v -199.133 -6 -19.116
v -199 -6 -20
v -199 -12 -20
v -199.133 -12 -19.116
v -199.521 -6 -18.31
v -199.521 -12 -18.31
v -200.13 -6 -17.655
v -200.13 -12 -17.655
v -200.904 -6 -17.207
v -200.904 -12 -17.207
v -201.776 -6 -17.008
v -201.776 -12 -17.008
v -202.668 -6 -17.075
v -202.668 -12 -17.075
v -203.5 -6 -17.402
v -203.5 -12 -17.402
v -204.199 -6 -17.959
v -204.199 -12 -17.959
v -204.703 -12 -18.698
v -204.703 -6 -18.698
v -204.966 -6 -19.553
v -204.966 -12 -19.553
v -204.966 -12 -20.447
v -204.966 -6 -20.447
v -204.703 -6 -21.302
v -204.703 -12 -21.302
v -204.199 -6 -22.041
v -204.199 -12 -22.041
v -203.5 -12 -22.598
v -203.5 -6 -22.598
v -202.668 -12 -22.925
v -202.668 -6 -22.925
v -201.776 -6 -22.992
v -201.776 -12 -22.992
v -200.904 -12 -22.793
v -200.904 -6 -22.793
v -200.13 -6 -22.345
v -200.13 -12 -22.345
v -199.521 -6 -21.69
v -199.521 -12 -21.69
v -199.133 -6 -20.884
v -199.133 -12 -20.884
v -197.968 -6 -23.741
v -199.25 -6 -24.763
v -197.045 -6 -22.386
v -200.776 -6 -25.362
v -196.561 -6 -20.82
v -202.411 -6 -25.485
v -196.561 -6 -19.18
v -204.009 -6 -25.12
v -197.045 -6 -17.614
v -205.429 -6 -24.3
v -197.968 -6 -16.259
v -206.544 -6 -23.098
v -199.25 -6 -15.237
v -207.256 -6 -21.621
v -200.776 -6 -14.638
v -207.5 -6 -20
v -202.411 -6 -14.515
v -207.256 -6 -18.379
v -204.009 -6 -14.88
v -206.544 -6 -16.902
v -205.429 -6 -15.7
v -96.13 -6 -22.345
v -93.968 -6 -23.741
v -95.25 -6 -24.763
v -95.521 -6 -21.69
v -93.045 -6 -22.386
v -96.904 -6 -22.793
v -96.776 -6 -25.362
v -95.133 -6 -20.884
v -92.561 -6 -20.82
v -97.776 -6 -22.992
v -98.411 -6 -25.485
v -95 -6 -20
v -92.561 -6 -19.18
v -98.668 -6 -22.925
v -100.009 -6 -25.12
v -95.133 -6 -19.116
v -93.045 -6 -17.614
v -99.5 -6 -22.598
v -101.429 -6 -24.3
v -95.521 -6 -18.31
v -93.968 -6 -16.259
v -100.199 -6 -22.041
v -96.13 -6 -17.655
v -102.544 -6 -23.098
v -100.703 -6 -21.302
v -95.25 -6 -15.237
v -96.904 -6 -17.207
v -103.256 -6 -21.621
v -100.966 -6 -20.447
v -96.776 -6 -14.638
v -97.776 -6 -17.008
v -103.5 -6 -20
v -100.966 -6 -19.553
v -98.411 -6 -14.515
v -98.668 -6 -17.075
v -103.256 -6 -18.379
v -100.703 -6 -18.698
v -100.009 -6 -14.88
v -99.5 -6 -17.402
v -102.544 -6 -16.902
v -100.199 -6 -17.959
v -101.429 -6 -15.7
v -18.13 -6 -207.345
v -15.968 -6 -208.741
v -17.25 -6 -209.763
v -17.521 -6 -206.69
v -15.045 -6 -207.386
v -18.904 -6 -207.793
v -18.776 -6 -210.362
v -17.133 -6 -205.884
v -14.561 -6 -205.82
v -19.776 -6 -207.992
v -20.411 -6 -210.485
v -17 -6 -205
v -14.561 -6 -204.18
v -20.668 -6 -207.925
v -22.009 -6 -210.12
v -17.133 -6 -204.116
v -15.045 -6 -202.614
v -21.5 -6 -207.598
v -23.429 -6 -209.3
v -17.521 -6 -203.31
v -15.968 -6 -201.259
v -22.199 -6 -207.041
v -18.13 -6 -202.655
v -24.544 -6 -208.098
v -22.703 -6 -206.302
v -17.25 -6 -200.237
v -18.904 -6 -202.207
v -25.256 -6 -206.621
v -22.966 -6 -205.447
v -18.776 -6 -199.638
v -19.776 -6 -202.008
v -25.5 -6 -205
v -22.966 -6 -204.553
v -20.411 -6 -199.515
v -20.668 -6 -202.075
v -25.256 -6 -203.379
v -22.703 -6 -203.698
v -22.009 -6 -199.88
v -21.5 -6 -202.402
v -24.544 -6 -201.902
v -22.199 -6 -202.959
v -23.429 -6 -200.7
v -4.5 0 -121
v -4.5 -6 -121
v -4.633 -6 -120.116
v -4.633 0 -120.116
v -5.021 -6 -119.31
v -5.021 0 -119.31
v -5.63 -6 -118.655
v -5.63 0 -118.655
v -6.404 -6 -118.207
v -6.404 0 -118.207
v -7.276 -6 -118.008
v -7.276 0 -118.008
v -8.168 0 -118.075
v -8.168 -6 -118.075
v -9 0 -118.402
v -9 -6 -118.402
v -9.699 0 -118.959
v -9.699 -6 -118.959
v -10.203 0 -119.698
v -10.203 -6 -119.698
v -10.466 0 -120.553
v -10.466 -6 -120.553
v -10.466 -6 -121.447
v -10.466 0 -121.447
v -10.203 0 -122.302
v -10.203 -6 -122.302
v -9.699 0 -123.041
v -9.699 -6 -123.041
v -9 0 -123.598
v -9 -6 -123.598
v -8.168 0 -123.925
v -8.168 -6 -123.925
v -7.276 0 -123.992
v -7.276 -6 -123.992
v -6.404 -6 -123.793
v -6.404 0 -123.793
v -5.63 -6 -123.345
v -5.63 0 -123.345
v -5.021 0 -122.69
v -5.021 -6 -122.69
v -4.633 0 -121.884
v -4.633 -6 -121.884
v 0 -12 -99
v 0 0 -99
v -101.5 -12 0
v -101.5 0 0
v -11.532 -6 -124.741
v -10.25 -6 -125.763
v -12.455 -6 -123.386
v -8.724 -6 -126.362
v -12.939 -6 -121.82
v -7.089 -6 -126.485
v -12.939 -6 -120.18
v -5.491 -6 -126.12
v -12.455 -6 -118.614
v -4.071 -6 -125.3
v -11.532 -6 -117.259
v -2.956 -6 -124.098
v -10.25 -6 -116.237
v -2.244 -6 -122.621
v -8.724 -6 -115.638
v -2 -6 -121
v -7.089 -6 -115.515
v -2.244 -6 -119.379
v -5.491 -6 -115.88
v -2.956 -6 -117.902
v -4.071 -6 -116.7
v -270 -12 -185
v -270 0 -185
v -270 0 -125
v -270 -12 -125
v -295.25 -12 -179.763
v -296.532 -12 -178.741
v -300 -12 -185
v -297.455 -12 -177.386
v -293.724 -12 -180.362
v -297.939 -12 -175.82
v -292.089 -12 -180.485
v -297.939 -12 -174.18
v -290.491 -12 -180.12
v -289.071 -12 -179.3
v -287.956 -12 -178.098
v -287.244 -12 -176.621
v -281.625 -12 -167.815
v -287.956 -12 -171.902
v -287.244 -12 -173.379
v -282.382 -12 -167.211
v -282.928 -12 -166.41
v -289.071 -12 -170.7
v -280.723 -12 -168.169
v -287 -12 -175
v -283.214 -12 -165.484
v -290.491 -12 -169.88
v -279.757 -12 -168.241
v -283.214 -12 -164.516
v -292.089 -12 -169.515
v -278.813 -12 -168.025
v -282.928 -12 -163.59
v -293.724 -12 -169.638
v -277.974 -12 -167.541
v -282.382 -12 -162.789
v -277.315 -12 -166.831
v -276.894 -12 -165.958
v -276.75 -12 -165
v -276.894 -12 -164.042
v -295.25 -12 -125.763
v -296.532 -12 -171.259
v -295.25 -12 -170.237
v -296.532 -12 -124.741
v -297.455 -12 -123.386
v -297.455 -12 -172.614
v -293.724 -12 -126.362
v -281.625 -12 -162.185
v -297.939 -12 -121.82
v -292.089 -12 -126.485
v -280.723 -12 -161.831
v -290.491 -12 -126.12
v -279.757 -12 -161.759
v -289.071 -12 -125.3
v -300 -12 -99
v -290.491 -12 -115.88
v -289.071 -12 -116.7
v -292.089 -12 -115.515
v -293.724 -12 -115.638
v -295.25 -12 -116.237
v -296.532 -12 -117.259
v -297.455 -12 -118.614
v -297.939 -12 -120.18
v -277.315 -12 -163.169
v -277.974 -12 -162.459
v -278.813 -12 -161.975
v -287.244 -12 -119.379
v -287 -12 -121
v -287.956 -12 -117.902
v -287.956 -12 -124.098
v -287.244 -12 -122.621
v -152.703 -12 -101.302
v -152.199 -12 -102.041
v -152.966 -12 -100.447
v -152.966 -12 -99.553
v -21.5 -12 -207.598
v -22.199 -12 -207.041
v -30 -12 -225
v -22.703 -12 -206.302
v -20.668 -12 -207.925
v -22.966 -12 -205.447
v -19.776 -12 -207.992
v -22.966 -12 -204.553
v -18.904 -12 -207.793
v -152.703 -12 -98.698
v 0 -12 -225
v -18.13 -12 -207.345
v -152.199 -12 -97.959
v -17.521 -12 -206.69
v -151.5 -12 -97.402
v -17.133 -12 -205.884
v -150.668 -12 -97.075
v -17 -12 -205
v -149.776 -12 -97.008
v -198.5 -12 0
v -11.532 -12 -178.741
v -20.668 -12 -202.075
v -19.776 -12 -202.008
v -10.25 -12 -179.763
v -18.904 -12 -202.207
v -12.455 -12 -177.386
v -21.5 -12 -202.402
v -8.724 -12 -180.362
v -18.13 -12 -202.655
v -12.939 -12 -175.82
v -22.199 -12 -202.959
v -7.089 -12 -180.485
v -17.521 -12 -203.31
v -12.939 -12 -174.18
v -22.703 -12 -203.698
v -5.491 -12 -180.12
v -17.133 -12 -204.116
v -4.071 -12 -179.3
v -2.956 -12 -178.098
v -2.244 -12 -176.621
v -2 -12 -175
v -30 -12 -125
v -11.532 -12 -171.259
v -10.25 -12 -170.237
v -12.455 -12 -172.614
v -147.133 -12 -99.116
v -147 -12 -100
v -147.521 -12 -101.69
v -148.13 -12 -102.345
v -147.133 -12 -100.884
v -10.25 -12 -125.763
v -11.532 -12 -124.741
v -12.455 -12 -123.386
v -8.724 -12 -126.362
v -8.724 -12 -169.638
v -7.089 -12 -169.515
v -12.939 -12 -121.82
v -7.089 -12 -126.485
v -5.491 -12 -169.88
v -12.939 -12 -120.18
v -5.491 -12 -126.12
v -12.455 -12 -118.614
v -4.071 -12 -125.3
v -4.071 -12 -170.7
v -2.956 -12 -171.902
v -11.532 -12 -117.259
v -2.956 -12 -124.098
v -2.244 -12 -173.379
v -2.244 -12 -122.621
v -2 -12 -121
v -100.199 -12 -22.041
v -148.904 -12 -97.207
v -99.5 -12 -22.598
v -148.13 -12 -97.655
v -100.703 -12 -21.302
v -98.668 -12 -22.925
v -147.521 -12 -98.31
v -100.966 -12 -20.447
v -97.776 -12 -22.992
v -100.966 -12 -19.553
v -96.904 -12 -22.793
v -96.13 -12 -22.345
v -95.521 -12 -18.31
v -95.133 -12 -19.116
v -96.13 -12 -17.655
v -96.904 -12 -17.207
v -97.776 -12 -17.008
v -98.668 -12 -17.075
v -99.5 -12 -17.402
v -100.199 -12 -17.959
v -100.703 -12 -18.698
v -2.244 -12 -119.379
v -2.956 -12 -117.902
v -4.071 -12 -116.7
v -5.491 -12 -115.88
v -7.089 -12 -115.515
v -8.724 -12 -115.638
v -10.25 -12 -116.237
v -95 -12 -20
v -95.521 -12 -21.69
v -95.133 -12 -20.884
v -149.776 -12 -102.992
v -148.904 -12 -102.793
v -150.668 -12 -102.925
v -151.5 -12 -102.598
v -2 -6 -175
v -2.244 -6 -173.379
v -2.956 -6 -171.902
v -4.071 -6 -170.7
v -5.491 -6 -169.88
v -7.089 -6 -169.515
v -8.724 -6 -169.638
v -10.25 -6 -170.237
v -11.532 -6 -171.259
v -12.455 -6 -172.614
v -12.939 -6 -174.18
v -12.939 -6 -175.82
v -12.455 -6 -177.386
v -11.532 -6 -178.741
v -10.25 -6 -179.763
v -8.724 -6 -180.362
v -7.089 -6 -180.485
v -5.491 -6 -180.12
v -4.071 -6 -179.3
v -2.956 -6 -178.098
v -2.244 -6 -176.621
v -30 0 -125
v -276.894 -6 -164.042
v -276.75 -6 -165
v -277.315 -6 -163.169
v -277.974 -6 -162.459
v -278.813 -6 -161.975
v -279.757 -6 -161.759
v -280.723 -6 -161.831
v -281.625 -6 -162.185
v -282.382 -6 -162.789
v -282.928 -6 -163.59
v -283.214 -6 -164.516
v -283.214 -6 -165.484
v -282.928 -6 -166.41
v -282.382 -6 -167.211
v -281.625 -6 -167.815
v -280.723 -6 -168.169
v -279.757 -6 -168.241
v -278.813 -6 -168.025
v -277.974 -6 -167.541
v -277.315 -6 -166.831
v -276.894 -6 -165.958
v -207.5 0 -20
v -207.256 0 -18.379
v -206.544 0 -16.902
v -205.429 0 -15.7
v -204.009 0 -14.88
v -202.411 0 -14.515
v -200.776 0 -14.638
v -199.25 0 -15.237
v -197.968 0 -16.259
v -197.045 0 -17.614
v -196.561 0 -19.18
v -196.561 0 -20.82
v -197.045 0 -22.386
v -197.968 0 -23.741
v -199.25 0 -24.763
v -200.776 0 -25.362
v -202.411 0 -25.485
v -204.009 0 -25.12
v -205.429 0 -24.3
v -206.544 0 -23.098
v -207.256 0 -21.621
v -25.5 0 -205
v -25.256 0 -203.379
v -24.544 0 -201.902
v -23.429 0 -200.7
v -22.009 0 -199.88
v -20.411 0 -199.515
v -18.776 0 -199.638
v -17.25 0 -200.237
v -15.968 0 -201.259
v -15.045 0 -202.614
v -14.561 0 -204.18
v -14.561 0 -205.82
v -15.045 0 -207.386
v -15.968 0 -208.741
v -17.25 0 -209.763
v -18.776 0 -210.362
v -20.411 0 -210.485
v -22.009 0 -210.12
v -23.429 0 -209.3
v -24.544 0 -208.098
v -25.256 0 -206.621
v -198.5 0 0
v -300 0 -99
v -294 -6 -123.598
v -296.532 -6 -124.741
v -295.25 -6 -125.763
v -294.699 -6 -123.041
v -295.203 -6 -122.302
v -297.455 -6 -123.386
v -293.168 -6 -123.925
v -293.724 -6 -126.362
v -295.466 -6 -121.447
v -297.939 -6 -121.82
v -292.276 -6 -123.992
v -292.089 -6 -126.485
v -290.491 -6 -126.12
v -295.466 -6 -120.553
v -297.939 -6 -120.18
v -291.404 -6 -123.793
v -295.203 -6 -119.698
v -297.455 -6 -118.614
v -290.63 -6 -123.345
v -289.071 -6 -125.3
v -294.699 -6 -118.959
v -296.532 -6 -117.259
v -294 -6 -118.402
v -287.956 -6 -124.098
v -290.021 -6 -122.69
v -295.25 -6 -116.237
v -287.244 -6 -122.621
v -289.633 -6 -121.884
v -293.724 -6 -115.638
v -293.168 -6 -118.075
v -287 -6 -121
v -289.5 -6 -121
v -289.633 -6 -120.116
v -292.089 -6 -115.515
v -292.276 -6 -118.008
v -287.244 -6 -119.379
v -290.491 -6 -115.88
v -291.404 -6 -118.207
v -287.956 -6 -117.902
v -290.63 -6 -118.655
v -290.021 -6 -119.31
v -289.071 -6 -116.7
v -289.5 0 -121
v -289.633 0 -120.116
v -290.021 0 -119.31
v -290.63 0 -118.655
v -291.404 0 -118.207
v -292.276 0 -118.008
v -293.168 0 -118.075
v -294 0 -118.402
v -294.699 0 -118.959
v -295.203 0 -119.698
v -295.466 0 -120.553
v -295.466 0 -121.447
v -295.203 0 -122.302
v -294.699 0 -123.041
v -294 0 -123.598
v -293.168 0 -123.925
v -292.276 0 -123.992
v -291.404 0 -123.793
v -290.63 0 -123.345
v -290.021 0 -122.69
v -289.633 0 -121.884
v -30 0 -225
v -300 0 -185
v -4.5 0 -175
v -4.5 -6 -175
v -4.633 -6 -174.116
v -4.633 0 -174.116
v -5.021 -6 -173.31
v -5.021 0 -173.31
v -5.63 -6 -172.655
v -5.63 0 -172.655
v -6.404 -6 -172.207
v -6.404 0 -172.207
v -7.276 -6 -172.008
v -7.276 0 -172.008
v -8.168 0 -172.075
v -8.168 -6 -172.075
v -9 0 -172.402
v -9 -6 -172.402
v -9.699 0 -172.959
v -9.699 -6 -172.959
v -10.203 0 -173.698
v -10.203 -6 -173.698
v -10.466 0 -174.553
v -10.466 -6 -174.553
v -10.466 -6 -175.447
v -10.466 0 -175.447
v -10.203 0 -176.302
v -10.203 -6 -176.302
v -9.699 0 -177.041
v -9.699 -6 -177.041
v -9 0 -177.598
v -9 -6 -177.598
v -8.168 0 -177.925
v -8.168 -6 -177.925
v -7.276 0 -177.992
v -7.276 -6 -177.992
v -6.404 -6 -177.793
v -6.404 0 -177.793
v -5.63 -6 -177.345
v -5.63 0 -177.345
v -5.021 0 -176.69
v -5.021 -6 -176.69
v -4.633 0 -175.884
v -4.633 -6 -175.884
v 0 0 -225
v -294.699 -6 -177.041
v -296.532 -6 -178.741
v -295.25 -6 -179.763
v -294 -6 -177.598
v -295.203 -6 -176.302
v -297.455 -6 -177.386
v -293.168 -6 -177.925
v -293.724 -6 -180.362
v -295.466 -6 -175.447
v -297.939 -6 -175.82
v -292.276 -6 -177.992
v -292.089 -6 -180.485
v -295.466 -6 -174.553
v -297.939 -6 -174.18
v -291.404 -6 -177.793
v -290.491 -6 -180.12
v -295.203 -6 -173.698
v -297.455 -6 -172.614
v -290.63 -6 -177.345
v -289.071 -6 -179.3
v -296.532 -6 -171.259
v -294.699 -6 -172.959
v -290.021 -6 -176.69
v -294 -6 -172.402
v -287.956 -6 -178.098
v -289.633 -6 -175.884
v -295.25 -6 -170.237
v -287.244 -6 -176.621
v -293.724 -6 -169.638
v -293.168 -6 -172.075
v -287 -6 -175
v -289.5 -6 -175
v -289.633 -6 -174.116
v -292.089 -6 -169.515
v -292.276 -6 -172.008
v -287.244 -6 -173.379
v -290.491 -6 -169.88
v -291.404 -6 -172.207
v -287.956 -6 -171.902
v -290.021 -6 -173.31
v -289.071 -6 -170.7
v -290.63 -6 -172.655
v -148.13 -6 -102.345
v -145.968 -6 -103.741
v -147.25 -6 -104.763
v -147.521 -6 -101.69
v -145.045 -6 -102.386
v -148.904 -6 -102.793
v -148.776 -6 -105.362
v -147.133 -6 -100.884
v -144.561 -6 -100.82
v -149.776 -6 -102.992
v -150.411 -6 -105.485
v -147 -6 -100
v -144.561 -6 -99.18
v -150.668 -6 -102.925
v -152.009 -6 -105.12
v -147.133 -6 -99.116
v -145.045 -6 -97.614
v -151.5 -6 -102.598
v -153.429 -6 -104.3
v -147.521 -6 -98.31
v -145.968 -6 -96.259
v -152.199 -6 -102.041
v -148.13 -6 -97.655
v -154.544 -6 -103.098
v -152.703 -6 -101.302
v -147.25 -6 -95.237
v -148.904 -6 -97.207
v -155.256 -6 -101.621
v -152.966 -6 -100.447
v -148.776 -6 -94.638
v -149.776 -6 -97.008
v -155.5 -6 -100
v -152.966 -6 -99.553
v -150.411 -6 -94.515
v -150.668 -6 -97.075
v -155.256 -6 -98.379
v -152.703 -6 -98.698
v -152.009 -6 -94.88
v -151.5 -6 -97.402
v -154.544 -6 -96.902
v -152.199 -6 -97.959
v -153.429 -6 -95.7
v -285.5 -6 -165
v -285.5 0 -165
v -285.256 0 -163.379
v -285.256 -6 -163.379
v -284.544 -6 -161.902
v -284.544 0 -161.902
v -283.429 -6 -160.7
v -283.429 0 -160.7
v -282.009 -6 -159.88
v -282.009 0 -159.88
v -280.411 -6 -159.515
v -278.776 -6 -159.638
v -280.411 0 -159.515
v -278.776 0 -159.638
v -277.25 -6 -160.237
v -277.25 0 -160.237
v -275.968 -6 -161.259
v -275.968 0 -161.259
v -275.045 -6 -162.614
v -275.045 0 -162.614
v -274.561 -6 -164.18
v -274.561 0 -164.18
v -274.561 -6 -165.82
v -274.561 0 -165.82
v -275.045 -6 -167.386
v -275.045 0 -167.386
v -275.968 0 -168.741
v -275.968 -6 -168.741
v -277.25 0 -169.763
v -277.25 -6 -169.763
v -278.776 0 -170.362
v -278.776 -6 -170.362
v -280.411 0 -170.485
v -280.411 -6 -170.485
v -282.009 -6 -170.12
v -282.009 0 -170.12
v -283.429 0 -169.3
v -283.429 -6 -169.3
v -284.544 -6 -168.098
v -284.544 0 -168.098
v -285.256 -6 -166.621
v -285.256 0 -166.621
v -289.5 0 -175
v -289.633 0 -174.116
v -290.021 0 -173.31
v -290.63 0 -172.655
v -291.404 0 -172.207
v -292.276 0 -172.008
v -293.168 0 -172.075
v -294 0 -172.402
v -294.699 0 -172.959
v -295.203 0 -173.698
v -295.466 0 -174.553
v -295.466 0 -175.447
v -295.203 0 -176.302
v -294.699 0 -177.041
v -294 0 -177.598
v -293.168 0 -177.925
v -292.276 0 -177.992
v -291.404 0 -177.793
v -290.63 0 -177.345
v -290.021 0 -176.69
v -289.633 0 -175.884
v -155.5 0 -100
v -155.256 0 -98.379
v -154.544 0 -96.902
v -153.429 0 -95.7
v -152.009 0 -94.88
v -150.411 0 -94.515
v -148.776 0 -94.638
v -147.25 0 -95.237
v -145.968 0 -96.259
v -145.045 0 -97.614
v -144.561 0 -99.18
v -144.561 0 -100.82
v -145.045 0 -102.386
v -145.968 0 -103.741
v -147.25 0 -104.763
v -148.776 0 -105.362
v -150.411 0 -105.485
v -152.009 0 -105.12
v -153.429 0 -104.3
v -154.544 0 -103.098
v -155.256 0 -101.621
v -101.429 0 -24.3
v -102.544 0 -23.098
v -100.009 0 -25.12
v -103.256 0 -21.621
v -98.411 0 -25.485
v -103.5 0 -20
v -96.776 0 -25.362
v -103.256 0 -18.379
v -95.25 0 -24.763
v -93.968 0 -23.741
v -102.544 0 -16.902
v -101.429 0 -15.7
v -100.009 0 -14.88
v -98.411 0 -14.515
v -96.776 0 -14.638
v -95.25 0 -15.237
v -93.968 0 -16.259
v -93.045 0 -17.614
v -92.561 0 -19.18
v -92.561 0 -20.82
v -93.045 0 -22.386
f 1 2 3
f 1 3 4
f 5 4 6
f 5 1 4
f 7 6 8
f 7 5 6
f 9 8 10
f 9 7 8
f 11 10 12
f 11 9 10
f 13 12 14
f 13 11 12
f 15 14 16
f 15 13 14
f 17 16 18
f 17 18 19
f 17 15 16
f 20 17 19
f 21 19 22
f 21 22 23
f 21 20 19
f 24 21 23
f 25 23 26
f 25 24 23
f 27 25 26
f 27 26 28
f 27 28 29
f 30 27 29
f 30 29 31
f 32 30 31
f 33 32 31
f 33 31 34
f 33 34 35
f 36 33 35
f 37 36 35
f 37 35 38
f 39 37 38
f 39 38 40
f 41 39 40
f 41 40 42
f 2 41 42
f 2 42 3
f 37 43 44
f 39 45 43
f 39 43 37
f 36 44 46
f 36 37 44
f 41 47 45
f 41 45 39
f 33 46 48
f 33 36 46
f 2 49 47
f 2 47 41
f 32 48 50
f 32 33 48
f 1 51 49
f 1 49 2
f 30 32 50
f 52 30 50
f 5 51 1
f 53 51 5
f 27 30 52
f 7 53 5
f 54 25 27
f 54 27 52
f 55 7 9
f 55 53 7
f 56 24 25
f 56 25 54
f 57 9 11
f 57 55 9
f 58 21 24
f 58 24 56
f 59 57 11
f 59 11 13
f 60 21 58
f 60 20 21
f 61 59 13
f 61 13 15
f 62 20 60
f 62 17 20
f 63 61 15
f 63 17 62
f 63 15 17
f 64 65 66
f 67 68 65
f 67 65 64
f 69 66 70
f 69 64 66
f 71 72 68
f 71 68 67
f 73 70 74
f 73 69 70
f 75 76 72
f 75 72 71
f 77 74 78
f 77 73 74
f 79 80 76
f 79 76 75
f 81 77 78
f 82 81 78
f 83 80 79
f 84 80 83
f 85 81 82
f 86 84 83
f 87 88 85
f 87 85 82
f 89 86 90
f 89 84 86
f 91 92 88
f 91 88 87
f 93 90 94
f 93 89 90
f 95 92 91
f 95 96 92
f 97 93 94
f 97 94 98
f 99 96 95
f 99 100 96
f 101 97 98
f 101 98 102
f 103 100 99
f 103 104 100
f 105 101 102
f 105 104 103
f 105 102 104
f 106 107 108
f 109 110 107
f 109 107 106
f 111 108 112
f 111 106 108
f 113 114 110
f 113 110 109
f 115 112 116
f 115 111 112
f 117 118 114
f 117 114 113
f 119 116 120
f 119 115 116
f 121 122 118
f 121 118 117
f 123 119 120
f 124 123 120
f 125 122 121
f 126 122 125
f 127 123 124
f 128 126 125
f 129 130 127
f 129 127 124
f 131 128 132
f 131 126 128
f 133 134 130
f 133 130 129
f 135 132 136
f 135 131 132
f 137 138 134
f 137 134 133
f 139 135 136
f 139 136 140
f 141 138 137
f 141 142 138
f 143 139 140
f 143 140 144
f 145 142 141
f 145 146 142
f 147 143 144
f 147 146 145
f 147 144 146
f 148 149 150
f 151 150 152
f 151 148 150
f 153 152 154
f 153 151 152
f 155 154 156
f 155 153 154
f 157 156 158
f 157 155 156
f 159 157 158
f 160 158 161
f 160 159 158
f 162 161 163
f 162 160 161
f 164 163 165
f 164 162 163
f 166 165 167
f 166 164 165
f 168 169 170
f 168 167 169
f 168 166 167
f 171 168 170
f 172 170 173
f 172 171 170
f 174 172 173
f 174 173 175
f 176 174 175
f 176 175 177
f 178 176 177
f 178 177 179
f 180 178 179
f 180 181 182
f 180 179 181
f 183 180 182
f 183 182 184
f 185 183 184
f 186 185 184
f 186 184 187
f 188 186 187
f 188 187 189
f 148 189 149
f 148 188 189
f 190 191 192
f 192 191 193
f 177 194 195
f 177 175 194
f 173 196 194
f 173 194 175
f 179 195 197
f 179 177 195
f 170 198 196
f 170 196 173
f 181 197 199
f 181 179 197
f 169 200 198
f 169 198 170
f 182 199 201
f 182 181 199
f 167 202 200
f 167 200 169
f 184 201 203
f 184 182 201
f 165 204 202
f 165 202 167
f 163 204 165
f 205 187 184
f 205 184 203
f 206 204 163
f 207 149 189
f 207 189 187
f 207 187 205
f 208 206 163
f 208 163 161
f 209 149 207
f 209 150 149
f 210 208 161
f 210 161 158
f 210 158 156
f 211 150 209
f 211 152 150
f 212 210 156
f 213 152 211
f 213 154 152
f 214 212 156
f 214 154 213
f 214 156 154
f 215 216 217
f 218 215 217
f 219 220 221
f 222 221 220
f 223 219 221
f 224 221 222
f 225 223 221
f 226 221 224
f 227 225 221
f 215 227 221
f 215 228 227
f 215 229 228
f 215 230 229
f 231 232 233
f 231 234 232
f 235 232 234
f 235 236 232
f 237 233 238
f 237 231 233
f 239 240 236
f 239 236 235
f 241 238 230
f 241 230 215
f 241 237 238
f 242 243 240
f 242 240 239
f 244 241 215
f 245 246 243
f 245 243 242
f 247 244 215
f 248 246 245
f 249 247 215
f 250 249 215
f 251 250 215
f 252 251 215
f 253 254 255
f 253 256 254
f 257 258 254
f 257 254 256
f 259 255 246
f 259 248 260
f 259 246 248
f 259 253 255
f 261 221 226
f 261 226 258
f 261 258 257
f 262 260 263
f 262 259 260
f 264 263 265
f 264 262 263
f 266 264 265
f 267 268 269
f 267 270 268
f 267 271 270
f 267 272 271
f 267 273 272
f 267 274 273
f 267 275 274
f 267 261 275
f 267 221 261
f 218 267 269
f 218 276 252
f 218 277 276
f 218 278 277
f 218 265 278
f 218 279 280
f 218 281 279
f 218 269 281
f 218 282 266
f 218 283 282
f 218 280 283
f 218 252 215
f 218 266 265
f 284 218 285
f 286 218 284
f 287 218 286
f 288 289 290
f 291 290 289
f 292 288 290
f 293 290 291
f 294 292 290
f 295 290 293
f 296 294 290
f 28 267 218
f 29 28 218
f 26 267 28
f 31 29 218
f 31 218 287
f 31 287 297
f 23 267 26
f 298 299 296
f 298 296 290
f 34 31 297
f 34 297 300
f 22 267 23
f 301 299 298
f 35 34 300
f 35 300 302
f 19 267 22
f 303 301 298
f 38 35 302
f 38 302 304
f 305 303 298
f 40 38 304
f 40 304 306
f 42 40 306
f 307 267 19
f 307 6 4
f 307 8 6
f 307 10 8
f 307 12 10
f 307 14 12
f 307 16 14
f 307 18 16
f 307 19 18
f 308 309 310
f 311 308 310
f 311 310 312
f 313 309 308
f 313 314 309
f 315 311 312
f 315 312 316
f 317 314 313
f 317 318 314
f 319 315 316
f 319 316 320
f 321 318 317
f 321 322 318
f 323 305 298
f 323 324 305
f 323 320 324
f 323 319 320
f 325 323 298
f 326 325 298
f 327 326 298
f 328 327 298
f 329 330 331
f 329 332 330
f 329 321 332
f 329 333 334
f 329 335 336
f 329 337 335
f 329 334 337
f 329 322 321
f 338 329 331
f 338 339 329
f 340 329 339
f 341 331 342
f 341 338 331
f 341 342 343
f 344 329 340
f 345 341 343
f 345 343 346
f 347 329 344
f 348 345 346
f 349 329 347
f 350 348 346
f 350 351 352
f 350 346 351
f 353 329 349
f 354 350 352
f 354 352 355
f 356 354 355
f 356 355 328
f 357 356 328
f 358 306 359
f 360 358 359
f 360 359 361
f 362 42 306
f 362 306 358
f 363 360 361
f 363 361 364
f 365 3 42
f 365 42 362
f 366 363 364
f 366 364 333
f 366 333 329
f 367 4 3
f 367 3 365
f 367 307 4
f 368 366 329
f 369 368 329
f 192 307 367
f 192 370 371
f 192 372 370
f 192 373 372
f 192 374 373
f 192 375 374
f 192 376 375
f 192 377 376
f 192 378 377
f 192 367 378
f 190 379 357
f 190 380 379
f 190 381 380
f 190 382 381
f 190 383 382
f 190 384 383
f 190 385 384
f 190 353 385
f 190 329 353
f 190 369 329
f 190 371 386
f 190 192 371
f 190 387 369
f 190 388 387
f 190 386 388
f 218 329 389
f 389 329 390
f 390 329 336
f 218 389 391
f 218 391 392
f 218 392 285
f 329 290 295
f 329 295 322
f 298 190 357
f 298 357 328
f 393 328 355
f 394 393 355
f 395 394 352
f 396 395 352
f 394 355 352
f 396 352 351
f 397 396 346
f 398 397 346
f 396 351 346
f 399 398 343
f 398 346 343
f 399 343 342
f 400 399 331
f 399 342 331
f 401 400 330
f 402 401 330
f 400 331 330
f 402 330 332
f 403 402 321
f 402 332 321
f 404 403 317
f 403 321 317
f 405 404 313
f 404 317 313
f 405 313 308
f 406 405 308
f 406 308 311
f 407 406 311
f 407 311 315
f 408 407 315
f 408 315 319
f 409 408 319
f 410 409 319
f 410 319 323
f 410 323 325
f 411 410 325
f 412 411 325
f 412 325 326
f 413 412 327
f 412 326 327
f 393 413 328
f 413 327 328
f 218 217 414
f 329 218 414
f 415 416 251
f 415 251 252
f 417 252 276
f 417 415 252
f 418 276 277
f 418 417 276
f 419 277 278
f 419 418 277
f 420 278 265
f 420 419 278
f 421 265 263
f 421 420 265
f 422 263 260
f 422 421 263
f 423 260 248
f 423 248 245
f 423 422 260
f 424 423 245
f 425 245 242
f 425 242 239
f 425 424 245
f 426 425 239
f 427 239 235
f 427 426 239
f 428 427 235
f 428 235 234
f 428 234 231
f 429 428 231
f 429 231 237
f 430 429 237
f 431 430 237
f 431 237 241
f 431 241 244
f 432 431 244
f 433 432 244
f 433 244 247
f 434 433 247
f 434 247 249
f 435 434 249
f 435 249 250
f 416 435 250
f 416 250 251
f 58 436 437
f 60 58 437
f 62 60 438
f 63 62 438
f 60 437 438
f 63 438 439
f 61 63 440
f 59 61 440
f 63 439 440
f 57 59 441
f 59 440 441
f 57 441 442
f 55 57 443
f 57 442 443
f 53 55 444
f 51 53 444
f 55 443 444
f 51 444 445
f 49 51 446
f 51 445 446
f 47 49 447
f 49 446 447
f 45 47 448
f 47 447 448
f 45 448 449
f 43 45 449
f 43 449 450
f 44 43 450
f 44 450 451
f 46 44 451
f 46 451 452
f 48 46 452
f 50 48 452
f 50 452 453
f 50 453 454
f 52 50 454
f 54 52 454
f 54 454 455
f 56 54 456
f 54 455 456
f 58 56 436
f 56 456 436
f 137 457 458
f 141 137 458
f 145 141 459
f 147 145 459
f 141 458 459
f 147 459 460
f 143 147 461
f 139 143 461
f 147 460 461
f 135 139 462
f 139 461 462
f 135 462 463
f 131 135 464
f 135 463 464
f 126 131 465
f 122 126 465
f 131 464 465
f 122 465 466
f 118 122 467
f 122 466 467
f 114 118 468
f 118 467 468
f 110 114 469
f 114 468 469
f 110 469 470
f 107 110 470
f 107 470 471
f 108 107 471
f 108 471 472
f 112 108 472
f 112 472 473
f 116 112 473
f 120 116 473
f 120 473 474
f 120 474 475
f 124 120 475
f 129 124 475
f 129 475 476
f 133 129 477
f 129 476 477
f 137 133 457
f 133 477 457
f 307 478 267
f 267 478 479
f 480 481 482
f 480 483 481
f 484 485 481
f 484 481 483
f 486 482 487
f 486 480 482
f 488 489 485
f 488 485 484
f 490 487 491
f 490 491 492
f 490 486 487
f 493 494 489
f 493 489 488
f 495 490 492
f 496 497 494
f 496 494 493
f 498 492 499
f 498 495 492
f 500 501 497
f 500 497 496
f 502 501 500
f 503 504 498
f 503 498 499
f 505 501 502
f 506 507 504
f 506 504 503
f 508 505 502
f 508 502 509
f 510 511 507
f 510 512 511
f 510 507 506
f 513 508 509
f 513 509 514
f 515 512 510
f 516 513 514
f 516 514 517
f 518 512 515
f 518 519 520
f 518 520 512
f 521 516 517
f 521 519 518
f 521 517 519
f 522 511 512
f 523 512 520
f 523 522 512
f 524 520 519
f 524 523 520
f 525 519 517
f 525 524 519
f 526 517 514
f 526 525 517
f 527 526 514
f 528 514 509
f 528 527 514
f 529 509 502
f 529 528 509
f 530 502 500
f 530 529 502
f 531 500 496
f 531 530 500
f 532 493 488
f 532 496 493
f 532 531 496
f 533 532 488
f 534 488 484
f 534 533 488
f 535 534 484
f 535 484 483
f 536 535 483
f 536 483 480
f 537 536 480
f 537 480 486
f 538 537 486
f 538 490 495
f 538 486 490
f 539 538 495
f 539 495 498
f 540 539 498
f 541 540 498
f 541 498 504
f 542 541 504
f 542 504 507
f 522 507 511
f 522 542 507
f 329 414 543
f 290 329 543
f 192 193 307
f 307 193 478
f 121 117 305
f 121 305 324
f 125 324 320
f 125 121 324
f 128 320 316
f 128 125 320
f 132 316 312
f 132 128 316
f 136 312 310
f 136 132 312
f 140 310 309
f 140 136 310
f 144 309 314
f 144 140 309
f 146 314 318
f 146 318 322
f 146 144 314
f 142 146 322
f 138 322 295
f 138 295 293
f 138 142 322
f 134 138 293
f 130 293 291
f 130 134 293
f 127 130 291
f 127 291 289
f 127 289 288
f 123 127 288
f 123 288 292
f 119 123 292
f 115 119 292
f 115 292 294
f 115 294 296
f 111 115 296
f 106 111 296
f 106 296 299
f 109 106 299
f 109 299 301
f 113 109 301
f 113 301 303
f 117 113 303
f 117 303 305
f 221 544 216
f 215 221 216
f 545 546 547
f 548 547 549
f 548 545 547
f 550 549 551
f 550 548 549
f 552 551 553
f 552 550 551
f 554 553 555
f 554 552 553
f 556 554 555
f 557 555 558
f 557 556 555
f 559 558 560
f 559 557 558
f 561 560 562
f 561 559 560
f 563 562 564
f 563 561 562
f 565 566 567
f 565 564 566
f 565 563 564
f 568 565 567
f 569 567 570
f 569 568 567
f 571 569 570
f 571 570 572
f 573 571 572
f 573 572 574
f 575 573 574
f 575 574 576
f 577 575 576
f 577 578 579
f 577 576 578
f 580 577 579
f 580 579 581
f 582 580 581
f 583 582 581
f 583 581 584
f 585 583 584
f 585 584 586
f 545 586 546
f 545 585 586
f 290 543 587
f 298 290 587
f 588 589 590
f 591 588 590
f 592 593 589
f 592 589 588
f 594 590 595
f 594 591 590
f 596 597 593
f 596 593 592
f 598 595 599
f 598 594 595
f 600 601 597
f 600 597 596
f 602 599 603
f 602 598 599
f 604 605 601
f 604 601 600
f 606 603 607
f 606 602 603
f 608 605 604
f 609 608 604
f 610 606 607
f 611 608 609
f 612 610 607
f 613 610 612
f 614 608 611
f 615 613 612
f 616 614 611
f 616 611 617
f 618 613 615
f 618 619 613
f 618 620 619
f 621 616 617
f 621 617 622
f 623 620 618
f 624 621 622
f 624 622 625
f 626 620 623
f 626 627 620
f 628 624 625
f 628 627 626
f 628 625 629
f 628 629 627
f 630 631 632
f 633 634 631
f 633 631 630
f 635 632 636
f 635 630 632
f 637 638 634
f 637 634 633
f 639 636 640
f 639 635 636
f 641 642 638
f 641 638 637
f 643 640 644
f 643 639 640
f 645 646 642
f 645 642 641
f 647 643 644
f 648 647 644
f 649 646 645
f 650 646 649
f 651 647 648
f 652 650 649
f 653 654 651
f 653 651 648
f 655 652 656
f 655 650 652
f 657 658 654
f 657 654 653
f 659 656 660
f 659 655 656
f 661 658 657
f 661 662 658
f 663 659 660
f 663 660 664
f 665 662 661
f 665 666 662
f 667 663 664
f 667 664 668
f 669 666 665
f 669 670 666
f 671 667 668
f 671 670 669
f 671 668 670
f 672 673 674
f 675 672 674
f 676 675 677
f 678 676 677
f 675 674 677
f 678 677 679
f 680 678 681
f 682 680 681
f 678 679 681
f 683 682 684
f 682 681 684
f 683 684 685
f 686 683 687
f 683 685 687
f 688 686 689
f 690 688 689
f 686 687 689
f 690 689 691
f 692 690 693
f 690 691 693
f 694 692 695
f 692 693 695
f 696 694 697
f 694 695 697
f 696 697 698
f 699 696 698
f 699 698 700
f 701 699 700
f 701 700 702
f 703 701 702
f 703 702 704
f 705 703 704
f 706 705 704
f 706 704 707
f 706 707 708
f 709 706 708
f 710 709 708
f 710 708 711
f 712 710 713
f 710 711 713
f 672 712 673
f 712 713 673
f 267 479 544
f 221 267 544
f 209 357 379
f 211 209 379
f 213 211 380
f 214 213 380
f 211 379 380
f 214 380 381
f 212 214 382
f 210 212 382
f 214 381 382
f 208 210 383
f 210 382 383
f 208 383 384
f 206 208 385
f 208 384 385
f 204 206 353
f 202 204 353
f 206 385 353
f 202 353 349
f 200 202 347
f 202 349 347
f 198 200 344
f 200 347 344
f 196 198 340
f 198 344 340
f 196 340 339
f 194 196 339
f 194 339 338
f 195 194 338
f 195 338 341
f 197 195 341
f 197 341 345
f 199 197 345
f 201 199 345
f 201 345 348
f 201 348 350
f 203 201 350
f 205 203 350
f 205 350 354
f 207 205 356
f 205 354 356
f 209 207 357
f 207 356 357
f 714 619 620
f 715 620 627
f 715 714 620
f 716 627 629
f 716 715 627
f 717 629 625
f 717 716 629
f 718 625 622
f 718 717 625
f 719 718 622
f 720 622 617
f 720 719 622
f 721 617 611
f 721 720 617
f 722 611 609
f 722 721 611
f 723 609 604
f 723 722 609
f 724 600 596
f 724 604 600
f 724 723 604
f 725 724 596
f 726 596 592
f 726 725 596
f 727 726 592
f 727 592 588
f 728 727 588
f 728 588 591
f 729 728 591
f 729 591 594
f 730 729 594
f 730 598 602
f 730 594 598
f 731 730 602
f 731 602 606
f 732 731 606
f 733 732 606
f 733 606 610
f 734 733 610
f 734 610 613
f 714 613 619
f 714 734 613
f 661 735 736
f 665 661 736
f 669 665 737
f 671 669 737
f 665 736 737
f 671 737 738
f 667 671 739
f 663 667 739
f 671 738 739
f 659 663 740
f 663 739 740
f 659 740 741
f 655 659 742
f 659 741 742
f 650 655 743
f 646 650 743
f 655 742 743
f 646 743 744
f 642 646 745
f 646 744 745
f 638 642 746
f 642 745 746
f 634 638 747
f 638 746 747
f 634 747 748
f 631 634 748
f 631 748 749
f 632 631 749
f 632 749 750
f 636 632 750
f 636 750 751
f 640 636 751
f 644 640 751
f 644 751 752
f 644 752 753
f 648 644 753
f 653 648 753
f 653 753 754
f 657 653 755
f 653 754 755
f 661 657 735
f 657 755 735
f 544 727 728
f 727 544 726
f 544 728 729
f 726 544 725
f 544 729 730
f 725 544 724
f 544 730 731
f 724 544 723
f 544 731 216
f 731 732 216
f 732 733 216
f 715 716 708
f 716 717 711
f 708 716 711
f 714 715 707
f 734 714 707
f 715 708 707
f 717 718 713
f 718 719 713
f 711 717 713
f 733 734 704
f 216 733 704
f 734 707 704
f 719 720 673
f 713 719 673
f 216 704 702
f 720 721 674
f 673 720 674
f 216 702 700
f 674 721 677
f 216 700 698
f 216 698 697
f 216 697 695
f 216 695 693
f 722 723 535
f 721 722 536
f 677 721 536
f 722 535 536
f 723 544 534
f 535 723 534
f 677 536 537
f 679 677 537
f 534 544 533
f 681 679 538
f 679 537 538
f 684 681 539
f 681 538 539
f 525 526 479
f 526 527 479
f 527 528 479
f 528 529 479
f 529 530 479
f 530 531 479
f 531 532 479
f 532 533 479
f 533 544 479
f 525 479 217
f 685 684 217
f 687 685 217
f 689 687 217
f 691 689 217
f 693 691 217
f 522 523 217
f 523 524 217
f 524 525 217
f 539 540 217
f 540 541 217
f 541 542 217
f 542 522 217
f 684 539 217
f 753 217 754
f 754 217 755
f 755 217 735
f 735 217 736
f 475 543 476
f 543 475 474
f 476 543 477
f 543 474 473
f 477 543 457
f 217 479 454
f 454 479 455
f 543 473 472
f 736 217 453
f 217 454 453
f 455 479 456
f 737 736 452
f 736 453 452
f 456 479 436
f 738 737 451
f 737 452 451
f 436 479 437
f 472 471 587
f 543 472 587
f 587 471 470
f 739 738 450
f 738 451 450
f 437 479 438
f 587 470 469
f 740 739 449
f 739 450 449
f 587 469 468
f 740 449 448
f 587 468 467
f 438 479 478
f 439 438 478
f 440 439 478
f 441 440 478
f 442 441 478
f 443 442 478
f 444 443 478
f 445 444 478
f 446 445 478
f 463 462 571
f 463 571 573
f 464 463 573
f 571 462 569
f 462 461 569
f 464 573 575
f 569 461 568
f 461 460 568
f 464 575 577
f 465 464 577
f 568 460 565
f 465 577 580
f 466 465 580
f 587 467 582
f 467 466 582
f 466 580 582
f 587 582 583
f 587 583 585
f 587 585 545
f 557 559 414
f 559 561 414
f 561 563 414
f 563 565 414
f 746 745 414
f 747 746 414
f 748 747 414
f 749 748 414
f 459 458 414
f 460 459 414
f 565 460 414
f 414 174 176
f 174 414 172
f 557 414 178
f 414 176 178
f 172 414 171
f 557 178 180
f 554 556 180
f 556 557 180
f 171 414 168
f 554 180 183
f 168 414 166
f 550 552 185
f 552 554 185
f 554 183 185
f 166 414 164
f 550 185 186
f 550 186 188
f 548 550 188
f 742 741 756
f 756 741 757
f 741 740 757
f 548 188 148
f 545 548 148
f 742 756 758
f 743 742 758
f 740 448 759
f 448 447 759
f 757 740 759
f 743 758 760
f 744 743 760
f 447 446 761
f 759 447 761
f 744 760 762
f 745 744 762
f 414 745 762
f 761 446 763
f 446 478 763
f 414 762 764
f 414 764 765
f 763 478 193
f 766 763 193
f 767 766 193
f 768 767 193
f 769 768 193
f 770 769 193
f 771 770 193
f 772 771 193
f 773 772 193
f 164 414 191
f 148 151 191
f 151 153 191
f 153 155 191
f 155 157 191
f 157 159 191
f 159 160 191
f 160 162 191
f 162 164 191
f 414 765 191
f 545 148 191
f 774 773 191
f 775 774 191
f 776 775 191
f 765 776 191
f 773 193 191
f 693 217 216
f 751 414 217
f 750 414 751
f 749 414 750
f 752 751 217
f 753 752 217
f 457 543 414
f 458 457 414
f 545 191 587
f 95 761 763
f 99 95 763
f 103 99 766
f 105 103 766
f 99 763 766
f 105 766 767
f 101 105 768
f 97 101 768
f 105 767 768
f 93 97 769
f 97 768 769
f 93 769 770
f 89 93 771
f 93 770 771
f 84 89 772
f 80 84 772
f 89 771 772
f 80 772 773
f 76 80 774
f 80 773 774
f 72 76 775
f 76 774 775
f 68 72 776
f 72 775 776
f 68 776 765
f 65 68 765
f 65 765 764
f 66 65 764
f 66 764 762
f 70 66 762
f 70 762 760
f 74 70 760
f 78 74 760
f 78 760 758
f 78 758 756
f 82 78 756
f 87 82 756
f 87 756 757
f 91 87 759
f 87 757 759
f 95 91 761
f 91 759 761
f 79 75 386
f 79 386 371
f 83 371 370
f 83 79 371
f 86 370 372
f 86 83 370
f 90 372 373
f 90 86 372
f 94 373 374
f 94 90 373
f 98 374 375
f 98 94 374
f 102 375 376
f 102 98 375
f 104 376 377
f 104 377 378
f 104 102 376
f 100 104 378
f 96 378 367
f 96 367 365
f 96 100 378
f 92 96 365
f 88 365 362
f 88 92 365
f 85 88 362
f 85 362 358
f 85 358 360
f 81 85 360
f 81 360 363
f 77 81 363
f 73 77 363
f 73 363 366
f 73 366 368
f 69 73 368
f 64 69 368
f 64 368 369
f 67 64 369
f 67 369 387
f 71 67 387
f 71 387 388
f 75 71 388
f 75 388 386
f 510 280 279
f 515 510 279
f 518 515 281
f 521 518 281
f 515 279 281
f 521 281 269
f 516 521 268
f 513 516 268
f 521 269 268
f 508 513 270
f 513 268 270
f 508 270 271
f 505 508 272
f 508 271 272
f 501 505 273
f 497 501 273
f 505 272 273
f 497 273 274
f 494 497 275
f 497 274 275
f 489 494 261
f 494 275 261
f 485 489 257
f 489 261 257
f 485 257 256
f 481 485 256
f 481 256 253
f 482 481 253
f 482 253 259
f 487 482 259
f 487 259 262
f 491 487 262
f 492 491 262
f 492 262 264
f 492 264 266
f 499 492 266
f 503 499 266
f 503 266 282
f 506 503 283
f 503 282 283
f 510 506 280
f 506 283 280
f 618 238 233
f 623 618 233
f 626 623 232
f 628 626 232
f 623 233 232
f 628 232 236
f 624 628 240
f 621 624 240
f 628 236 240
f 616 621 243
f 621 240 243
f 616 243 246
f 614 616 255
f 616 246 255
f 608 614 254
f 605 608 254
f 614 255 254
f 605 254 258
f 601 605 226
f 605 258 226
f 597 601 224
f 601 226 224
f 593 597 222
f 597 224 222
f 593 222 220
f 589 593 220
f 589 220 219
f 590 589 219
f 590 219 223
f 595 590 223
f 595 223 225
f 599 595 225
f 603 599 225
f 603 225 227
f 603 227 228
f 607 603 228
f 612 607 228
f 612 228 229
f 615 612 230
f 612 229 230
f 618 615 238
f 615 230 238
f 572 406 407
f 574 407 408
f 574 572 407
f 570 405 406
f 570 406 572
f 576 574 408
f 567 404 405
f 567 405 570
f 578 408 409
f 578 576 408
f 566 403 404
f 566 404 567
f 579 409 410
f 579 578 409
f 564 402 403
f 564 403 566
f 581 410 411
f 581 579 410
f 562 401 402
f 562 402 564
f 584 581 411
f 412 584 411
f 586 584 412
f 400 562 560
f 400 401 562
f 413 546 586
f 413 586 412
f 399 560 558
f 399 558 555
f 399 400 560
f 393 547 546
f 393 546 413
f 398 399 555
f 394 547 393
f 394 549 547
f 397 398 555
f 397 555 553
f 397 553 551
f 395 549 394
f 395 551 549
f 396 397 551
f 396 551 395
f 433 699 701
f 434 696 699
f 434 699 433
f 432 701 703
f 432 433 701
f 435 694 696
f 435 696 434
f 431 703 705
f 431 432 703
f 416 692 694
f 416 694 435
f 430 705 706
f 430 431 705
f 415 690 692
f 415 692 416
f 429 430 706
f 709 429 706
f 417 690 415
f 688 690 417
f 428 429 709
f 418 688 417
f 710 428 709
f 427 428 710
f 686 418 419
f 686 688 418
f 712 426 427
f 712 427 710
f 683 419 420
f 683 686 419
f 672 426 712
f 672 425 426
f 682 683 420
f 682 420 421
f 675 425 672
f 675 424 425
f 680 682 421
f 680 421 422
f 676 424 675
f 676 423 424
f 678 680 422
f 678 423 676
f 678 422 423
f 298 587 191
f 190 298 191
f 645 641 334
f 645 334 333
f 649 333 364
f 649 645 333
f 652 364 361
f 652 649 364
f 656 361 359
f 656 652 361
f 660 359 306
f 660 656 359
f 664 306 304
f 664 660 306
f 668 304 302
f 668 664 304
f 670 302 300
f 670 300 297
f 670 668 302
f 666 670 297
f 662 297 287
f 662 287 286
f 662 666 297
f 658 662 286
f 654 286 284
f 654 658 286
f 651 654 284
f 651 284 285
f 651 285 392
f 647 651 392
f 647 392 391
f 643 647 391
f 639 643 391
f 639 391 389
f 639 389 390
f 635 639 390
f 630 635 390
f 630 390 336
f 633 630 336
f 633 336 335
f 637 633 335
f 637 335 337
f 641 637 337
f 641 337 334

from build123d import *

# Parameters (mm, degrees)
F0_R     = 3
F0_R_2   = 3.25
F1_DEPTH = 12
F2_R     = 5.5
F3_DEPTH = 6
F4_R     = 5.5
F5_DEPTH = 6


with BuildPart() as f1:
    # F0 (on Front) → F1 (new body)
    with BuildSketch(Plane.XZ):
        Polygon((-300, -99), (-300, -185), (-270, -185), (-270, -125), (-30, -125), (-30, -225), (0, -225), (0, -99), (-101.5, 0), (-198.5, 0), align=None)
        with Locations((-292.5, -175)):
            Circle(F0_R, mode=Mode.SUBTRACT)
        with Locations((-280, -165)):
            Circle(F0_R_2, mode=Mode.SUBTRACT)
        with Locations((-292.5, -121)):
            Circle(F0_R, mode=Mode.SUBTRACT)
        with Locations((-20, -205)):
            Circle(F0_R, mode=Mode.SUBTRACT)
        with Locations((-7.5, -175)):
            Circle(F0_R, mode=Mode.SUBTRACT)
        with Locations((-7.5, -121)):
            Circle(F0_R, mode=Mode.SUBTRACT)
        with Locations((-202, -20)):
            Circle(F0_R, mode=Mode.SUBTRACT)
        with Locations((-150, -100)):
            Circle(F0_R, mode=Mode.SUBTRACT)
        with Locations((-98, -20)):
            Circle(F0_R, mode=Mode.SUBTRACT)
    extrude(amount=F1_DEPTH)

    # F2 (on face) → F3 (cut)
    with BuildSketch(Plane.XZ.offset(12)):
        with Locations((-292.5, -175)):
            Circle(F2_R)
        with Locations((-292.5, -121)):
            Circle(F2_R)
        with Locations((-7.5, -175)):
            Circle(F2_R)
        with Locations((-7.5, -121)):
            Circle(F2_R)
    extrude(amount=-F3_DEPTH, mode=Mode.SUBTRACT)

    # F4 (on face) → F5 (cut)
    with BuildSketch(Plane(origin=(0, 0, 0), x_dir=(-1, 0, 0), z_dir=(0, 1, 0))):
        with Locations((20, -205)):
            Circle(F4_R)
        with Locations((280, -165)):
            Circle(F4_R)
        with Locations((98, -20)):
            Circle(F4_R)
        with Locations((202, -20)):
            Circle(F4_R)
        with Locations((150, -100)):
            Circle(F4_R)
    extrude(amount=-F5_DEPTH, mode=Mode.SUBTRACT)


solid = f1.part
